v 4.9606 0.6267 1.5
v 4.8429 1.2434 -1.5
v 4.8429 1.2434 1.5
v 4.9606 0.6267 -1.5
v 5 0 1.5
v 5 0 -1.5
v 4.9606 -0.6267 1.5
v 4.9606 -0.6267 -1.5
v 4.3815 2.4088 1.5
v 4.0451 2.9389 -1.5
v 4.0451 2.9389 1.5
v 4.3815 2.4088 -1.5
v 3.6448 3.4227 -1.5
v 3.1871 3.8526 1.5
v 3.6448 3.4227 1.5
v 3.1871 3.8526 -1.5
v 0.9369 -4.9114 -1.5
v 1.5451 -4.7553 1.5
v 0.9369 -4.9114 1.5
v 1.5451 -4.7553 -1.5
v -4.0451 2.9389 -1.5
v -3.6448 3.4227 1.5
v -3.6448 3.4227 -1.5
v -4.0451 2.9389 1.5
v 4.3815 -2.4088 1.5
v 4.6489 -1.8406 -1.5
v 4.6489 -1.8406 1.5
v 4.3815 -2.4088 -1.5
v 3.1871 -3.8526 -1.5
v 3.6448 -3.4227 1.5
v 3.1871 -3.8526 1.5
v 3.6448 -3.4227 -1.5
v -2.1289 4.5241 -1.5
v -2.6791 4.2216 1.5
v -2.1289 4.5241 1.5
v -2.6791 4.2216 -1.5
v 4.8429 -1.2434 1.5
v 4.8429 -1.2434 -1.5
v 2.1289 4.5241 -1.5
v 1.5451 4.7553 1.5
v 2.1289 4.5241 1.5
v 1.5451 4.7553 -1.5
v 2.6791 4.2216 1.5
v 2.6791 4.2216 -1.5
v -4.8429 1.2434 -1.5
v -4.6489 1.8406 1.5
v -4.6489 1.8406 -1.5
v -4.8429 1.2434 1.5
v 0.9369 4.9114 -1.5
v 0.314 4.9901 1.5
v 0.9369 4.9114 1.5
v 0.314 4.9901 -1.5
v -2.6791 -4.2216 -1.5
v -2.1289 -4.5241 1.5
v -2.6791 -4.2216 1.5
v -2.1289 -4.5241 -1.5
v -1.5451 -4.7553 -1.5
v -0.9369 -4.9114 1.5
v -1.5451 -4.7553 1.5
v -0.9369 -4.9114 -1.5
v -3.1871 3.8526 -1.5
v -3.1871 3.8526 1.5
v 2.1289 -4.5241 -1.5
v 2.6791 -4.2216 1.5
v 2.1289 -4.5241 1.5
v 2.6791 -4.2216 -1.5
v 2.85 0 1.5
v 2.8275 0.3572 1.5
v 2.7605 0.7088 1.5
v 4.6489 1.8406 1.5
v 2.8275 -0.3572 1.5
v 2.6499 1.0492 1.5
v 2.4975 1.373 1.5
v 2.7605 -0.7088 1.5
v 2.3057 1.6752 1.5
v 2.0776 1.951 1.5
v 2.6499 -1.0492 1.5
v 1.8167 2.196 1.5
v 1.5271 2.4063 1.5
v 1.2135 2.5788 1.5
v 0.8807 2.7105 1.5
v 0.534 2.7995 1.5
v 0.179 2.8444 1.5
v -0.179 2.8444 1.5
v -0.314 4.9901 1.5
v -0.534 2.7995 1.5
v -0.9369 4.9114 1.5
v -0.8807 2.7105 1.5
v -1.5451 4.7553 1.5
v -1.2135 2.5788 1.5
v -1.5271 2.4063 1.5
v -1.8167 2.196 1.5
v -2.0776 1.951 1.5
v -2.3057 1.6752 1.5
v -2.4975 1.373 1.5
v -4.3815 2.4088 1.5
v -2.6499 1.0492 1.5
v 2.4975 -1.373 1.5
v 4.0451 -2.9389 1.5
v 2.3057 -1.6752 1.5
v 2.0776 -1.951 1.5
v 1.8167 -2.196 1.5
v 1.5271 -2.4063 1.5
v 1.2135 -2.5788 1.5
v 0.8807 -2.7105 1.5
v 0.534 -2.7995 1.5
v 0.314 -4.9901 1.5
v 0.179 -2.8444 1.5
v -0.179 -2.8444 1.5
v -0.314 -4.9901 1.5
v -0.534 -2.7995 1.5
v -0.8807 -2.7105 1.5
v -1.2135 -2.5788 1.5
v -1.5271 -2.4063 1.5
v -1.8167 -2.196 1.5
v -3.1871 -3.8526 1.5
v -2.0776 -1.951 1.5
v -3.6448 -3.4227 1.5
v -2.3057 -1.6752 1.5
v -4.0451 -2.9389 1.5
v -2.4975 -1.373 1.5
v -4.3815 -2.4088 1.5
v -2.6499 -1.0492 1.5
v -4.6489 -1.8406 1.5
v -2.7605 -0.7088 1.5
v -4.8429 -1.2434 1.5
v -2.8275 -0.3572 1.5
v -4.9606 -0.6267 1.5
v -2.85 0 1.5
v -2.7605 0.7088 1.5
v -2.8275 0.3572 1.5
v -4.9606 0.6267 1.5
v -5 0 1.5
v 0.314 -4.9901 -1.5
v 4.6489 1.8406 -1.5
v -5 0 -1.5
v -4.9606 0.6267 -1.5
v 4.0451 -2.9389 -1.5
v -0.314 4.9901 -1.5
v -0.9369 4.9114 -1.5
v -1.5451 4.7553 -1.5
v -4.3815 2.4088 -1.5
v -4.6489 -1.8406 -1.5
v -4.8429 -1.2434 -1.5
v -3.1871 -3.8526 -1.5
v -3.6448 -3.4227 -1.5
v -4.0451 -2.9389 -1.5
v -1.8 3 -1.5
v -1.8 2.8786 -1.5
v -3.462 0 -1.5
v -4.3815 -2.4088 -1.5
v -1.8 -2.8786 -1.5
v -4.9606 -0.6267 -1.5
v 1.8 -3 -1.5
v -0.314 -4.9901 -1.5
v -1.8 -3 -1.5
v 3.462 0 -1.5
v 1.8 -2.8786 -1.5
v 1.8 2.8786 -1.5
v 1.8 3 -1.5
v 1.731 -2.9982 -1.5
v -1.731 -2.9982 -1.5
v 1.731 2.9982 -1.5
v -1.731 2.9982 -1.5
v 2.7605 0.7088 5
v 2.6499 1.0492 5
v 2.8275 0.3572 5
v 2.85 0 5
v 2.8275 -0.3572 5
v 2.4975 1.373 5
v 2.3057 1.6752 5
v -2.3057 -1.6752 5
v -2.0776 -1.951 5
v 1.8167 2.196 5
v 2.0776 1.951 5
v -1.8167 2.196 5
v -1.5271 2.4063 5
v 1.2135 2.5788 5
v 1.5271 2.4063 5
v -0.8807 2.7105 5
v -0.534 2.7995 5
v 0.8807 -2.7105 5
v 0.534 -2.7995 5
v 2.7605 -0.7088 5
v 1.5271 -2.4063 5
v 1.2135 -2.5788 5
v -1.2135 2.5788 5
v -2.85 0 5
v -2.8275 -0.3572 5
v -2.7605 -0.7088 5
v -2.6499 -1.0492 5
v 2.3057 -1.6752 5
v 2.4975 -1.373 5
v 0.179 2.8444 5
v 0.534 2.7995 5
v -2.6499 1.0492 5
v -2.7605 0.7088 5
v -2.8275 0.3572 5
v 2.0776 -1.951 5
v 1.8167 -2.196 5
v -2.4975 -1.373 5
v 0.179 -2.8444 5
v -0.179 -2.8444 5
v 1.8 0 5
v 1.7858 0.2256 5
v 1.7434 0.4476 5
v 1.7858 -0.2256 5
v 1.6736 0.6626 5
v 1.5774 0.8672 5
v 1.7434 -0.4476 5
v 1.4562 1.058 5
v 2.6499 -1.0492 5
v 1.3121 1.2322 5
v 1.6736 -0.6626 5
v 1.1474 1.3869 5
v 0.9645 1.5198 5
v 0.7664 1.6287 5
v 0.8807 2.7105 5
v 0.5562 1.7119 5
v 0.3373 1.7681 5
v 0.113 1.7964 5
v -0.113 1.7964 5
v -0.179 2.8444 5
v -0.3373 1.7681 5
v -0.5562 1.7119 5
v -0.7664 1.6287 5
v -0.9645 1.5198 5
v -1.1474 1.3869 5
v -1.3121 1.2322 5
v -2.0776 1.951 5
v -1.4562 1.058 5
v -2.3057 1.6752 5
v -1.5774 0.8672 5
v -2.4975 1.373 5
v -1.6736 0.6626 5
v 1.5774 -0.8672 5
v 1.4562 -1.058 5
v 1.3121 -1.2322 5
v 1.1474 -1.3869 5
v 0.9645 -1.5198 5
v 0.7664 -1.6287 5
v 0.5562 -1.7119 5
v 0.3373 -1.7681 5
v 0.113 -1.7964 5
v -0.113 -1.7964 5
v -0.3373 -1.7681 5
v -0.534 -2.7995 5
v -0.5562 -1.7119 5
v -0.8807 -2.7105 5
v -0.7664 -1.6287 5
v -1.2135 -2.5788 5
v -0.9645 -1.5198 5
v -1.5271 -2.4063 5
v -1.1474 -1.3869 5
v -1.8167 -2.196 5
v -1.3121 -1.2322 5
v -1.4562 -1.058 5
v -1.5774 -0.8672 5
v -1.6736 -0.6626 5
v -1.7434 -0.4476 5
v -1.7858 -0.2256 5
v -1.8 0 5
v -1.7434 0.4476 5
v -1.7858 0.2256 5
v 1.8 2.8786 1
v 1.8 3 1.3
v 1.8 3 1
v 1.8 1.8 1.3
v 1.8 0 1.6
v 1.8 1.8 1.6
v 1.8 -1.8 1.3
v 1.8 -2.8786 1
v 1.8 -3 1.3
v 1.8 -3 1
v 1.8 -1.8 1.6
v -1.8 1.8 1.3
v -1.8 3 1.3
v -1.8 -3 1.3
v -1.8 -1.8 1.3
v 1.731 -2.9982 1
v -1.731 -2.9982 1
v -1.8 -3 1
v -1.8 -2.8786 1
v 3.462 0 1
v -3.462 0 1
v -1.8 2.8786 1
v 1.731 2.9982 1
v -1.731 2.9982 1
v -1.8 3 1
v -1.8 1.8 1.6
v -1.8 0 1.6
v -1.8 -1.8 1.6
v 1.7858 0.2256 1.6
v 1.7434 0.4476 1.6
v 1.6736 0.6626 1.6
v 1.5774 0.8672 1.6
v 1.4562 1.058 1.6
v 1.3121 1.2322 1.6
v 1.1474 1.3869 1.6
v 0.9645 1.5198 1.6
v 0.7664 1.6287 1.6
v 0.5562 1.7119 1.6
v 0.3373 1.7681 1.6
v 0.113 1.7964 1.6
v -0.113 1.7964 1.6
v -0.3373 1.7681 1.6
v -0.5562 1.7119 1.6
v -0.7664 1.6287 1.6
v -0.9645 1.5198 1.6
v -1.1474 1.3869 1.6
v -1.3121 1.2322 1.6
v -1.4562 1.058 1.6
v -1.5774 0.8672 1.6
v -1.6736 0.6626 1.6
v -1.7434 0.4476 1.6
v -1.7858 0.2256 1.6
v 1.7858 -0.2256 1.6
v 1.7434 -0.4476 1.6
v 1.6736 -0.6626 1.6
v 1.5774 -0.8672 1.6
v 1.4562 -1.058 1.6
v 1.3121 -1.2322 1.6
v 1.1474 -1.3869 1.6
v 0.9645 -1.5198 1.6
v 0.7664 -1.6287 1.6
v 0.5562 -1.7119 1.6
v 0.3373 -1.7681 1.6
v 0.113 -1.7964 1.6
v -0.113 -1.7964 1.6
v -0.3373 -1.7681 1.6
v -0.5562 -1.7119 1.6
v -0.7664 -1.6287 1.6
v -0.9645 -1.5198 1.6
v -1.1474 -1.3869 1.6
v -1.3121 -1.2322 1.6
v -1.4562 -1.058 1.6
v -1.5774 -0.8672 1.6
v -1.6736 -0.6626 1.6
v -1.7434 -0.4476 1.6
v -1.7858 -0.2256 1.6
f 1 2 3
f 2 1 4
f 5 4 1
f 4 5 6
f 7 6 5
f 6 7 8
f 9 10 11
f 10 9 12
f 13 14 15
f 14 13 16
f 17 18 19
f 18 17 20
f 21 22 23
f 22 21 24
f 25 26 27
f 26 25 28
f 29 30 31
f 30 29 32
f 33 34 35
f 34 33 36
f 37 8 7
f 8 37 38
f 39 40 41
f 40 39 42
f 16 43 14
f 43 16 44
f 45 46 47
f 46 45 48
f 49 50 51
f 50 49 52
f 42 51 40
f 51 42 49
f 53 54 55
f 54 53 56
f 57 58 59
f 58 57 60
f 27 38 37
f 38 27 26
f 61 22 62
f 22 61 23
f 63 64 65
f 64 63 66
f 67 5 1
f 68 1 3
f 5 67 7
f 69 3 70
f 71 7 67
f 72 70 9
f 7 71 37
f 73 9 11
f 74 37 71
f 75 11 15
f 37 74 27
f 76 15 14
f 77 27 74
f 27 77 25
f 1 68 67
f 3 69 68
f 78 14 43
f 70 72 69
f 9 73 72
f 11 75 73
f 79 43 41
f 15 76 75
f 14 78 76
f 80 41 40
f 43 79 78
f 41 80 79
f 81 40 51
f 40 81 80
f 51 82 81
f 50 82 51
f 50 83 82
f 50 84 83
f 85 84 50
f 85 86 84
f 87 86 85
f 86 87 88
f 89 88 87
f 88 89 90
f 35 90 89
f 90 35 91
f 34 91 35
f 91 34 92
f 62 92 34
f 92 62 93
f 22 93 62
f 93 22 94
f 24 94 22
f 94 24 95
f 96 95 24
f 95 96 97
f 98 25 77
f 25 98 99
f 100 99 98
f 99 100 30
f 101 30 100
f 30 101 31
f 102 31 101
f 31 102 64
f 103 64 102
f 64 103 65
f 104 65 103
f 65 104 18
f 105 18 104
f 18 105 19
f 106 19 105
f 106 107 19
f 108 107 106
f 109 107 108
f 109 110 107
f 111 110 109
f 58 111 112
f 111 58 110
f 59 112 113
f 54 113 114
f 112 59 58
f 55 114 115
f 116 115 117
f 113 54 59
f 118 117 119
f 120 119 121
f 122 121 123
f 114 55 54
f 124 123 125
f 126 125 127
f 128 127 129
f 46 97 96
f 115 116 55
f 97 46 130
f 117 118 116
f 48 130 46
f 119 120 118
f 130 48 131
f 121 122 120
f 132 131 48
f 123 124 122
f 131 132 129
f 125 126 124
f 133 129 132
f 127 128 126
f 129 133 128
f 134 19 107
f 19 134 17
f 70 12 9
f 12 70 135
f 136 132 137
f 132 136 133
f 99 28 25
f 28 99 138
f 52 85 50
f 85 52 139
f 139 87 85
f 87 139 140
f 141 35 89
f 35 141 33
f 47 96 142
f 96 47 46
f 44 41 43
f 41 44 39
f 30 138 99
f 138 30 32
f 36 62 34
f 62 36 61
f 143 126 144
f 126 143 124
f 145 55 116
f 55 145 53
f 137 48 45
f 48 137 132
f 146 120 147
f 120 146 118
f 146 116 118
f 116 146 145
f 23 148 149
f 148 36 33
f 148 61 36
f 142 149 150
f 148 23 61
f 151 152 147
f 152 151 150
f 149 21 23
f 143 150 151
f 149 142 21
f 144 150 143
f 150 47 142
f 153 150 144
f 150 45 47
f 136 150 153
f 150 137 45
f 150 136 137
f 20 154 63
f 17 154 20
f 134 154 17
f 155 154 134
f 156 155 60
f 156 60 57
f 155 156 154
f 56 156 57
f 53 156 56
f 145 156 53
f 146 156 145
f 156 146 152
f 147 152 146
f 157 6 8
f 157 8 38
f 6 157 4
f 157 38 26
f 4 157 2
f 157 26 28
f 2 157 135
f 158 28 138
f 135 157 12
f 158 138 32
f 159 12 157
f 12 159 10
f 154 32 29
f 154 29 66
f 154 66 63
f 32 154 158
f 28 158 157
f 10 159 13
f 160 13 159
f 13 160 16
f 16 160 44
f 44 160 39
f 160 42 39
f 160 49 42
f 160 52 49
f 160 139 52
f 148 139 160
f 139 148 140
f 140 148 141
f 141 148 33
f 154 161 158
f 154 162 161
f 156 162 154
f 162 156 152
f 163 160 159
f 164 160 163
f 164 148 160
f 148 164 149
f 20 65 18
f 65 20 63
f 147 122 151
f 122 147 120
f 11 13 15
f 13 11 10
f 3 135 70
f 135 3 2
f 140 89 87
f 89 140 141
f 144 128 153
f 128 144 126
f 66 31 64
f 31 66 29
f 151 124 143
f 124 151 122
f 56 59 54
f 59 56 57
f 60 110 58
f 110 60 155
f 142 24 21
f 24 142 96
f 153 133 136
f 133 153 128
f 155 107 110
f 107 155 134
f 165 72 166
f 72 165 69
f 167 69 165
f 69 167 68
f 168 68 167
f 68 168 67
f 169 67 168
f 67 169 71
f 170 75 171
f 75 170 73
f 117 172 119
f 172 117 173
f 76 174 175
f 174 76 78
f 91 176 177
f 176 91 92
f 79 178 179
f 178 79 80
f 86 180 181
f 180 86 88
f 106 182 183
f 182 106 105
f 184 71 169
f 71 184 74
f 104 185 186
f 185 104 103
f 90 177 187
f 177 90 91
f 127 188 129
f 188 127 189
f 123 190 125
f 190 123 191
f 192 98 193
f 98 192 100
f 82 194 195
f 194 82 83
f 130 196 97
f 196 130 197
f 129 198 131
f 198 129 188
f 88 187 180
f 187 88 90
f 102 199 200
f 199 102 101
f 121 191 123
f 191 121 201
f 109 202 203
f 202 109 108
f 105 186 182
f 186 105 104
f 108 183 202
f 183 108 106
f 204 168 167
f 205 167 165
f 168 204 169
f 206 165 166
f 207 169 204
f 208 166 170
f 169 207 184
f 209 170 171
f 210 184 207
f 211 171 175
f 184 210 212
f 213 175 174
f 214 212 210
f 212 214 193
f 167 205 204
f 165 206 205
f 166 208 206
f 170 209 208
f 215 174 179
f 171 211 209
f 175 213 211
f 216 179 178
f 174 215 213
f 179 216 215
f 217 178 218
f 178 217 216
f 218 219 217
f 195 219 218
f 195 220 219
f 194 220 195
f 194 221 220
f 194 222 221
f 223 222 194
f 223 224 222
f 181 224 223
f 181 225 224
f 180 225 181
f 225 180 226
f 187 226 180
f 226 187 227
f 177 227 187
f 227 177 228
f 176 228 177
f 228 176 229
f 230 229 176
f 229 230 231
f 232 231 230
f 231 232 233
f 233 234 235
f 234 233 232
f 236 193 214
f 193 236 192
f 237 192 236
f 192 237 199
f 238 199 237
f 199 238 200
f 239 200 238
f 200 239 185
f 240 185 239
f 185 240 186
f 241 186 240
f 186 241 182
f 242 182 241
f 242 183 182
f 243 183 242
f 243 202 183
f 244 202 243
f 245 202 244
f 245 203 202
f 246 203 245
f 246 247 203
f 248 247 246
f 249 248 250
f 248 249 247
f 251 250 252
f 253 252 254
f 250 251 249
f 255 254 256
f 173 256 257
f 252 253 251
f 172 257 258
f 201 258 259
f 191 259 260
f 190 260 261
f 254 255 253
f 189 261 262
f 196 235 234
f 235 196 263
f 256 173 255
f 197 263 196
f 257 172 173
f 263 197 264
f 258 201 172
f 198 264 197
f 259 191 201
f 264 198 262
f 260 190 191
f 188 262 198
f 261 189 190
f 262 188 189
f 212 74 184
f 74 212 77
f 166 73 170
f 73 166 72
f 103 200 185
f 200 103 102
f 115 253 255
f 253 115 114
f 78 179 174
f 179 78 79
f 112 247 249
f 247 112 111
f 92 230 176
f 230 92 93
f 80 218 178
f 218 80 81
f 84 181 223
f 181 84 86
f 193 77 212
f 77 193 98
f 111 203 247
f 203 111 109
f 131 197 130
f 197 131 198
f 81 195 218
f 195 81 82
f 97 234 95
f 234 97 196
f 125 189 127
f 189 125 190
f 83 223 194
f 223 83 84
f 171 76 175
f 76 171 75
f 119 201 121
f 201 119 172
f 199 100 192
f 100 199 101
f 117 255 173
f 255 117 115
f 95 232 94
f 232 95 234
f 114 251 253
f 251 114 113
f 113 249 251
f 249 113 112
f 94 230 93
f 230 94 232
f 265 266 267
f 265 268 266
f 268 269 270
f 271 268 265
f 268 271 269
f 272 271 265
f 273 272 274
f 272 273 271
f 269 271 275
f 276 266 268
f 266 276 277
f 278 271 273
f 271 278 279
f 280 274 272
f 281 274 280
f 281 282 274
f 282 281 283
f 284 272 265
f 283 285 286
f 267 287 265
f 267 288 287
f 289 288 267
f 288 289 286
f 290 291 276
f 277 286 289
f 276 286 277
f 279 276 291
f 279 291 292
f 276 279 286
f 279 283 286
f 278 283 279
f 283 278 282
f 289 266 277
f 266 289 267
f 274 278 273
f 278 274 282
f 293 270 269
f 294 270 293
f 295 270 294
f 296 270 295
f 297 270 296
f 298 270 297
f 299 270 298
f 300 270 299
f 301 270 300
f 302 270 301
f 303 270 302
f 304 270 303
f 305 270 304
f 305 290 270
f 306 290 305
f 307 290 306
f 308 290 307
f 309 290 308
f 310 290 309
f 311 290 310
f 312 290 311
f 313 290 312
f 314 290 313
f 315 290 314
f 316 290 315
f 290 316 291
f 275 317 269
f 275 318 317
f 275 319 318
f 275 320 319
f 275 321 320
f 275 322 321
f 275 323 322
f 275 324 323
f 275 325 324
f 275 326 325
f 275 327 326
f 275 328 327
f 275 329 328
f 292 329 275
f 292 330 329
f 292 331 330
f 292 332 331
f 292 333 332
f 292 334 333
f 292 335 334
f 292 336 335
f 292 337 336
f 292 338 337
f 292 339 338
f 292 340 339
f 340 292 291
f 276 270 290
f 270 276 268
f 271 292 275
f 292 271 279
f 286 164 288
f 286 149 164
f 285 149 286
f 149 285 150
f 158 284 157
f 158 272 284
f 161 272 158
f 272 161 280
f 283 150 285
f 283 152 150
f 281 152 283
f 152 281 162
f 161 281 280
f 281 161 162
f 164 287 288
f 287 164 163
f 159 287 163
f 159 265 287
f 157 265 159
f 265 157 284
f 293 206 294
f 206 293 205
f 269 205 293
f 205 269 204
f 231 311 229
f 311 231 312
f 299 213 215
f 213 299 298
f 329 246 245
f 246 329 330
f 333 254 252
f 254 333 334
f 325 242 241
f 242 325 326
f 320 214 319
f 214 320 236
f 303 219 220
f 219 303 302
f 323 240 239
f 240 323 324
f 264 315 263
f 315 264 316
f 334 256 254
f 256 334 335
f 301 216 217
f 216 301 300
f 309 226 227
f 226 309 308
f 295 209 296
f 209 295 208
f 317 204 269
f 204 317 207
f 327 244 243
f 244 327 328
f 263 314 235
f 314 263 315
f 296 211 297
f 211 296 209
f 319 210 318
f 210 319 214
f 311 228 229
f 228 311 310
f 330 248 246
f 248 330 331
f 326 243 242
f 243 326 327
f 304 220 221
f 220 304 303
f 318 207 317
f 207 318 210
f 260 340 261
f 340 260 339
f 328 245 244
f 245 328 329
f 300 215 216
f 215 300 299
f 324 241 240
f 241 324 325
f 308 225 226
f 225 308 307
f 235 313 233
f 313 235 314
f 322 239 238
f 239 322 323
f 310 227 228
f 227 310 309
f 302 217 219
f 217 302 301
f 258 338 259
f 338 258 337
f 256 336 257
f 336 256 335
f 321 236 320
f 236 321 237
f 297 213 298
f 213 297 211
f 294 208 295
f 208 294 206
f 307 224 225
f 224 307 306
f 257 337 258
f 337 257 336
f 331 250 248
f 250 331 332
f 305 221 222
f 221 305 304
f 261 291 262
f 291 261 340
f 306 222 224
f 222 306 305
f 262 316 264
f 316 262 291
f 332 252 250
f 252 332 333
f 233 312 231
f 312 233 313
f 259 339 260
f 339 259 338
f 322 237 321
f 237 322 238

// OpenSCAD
$fn = 50;


difference() {
	union() {
		translate(v = [0, 0, -1.5000000000]) {
			cylinder(h = 3, r = 5.0000000000);
		}
		translate(v = [0, 0, -1.5000000000]) {
			cylinder(h = 6.5000000000, r = 2.8500000000);
		}
	}
	union() {
		translate(v = [0, 0, -1.5000000000]) {
			rotate(a = [0, 0, 0]) {
				difference() {
					union() {
						translate(v = [-1.8000000000, -3.0000000000, -0.3000000000]) {
							cube(size = [3.6000000000, 6.0000000000, 0.3000000000]);
						}
						translate(v = [-1.8000000000, -1.8000000000, -0.6000000000]) {
							cube(size = [3.6000000000, 3.6000000000, 0.3000000000]);
						}
						translate(v = [-1.8000000000, -3.0000000000, 2.5000000000]) {
							cube(size = [3.6000000000, 6.0000000000, 0.3000000000]);
						}
						translate(v = [-1.8000000000, -1.8000000000, 2.8000000000]) {
							cube(size = [3.6000000000, 3.6000000000, 0.3000000000]);
						}
						linear_extrude(height = 2.5000000000) {
							polygon(points = [[3.4620000000, 0.0000000000], [1.7310000000, 2.9981799479], [-1.7310000000, 2.9981799479], [-3.4620000000, 0.0000000000], [-1.7310000000, -2.9981799479], [1.7310000000, -2.9981799479]]);
						}
						translate(v = [-1.8000000000, -3.0000000000, -0.3000000000]) {
							cube(size = [3.6000000000, 6.0000000000, 0.3000000000]);
						}
						translate(v = [-1.8000000000, -1.8000000000, -0.6000000000]) {
							cube(size = [3.6000000000, 3.6000000000, 0.3000000000]);
						}
						translate(v = [-1.8000000000, -3.0000000000, 2.5000000000]) {
							cube(size = [3.6000000000, 6.0000000000, 0.3000000000]);
						}
						translate(v = [-1.8000000000, -1.8000000000, 2.8000000000]) {
							cube(size = [3.6000000000, 3.6000000000, 0.3000000000]);
						}
						translate(v = [-1.8000000000, -3.0000000000, -0.3000000000]) {
							cube(size = [3.6000000000, 6.0000000000, 0.3000000000]);
						}
						translate(v = [-1.8000000000, -1.8000000000, -0.6000000000]) {
							cube(size = [3.6000000000, 3.6000000000, 0.3000000000]);
						}
						translate(v = [-1.8000000000, -3.0000000000, 2.5000000000]) {
							cube(size = [3.6000000000, 6.0000000000, 0.3000000000]);
						}
						translate(v = [-1.8000000000, -1.8000000000, 2.8000000000]) {
							cube(size = [3.6000000000, 3.6000000000, 0.3000000000]);
						}
					}
					union();
				}
			}
		}
		translate(v = [0, 0, -50.0000000000]) {
			cylinder(h = 100, r = 1.8000000000);
		}
	}
}
